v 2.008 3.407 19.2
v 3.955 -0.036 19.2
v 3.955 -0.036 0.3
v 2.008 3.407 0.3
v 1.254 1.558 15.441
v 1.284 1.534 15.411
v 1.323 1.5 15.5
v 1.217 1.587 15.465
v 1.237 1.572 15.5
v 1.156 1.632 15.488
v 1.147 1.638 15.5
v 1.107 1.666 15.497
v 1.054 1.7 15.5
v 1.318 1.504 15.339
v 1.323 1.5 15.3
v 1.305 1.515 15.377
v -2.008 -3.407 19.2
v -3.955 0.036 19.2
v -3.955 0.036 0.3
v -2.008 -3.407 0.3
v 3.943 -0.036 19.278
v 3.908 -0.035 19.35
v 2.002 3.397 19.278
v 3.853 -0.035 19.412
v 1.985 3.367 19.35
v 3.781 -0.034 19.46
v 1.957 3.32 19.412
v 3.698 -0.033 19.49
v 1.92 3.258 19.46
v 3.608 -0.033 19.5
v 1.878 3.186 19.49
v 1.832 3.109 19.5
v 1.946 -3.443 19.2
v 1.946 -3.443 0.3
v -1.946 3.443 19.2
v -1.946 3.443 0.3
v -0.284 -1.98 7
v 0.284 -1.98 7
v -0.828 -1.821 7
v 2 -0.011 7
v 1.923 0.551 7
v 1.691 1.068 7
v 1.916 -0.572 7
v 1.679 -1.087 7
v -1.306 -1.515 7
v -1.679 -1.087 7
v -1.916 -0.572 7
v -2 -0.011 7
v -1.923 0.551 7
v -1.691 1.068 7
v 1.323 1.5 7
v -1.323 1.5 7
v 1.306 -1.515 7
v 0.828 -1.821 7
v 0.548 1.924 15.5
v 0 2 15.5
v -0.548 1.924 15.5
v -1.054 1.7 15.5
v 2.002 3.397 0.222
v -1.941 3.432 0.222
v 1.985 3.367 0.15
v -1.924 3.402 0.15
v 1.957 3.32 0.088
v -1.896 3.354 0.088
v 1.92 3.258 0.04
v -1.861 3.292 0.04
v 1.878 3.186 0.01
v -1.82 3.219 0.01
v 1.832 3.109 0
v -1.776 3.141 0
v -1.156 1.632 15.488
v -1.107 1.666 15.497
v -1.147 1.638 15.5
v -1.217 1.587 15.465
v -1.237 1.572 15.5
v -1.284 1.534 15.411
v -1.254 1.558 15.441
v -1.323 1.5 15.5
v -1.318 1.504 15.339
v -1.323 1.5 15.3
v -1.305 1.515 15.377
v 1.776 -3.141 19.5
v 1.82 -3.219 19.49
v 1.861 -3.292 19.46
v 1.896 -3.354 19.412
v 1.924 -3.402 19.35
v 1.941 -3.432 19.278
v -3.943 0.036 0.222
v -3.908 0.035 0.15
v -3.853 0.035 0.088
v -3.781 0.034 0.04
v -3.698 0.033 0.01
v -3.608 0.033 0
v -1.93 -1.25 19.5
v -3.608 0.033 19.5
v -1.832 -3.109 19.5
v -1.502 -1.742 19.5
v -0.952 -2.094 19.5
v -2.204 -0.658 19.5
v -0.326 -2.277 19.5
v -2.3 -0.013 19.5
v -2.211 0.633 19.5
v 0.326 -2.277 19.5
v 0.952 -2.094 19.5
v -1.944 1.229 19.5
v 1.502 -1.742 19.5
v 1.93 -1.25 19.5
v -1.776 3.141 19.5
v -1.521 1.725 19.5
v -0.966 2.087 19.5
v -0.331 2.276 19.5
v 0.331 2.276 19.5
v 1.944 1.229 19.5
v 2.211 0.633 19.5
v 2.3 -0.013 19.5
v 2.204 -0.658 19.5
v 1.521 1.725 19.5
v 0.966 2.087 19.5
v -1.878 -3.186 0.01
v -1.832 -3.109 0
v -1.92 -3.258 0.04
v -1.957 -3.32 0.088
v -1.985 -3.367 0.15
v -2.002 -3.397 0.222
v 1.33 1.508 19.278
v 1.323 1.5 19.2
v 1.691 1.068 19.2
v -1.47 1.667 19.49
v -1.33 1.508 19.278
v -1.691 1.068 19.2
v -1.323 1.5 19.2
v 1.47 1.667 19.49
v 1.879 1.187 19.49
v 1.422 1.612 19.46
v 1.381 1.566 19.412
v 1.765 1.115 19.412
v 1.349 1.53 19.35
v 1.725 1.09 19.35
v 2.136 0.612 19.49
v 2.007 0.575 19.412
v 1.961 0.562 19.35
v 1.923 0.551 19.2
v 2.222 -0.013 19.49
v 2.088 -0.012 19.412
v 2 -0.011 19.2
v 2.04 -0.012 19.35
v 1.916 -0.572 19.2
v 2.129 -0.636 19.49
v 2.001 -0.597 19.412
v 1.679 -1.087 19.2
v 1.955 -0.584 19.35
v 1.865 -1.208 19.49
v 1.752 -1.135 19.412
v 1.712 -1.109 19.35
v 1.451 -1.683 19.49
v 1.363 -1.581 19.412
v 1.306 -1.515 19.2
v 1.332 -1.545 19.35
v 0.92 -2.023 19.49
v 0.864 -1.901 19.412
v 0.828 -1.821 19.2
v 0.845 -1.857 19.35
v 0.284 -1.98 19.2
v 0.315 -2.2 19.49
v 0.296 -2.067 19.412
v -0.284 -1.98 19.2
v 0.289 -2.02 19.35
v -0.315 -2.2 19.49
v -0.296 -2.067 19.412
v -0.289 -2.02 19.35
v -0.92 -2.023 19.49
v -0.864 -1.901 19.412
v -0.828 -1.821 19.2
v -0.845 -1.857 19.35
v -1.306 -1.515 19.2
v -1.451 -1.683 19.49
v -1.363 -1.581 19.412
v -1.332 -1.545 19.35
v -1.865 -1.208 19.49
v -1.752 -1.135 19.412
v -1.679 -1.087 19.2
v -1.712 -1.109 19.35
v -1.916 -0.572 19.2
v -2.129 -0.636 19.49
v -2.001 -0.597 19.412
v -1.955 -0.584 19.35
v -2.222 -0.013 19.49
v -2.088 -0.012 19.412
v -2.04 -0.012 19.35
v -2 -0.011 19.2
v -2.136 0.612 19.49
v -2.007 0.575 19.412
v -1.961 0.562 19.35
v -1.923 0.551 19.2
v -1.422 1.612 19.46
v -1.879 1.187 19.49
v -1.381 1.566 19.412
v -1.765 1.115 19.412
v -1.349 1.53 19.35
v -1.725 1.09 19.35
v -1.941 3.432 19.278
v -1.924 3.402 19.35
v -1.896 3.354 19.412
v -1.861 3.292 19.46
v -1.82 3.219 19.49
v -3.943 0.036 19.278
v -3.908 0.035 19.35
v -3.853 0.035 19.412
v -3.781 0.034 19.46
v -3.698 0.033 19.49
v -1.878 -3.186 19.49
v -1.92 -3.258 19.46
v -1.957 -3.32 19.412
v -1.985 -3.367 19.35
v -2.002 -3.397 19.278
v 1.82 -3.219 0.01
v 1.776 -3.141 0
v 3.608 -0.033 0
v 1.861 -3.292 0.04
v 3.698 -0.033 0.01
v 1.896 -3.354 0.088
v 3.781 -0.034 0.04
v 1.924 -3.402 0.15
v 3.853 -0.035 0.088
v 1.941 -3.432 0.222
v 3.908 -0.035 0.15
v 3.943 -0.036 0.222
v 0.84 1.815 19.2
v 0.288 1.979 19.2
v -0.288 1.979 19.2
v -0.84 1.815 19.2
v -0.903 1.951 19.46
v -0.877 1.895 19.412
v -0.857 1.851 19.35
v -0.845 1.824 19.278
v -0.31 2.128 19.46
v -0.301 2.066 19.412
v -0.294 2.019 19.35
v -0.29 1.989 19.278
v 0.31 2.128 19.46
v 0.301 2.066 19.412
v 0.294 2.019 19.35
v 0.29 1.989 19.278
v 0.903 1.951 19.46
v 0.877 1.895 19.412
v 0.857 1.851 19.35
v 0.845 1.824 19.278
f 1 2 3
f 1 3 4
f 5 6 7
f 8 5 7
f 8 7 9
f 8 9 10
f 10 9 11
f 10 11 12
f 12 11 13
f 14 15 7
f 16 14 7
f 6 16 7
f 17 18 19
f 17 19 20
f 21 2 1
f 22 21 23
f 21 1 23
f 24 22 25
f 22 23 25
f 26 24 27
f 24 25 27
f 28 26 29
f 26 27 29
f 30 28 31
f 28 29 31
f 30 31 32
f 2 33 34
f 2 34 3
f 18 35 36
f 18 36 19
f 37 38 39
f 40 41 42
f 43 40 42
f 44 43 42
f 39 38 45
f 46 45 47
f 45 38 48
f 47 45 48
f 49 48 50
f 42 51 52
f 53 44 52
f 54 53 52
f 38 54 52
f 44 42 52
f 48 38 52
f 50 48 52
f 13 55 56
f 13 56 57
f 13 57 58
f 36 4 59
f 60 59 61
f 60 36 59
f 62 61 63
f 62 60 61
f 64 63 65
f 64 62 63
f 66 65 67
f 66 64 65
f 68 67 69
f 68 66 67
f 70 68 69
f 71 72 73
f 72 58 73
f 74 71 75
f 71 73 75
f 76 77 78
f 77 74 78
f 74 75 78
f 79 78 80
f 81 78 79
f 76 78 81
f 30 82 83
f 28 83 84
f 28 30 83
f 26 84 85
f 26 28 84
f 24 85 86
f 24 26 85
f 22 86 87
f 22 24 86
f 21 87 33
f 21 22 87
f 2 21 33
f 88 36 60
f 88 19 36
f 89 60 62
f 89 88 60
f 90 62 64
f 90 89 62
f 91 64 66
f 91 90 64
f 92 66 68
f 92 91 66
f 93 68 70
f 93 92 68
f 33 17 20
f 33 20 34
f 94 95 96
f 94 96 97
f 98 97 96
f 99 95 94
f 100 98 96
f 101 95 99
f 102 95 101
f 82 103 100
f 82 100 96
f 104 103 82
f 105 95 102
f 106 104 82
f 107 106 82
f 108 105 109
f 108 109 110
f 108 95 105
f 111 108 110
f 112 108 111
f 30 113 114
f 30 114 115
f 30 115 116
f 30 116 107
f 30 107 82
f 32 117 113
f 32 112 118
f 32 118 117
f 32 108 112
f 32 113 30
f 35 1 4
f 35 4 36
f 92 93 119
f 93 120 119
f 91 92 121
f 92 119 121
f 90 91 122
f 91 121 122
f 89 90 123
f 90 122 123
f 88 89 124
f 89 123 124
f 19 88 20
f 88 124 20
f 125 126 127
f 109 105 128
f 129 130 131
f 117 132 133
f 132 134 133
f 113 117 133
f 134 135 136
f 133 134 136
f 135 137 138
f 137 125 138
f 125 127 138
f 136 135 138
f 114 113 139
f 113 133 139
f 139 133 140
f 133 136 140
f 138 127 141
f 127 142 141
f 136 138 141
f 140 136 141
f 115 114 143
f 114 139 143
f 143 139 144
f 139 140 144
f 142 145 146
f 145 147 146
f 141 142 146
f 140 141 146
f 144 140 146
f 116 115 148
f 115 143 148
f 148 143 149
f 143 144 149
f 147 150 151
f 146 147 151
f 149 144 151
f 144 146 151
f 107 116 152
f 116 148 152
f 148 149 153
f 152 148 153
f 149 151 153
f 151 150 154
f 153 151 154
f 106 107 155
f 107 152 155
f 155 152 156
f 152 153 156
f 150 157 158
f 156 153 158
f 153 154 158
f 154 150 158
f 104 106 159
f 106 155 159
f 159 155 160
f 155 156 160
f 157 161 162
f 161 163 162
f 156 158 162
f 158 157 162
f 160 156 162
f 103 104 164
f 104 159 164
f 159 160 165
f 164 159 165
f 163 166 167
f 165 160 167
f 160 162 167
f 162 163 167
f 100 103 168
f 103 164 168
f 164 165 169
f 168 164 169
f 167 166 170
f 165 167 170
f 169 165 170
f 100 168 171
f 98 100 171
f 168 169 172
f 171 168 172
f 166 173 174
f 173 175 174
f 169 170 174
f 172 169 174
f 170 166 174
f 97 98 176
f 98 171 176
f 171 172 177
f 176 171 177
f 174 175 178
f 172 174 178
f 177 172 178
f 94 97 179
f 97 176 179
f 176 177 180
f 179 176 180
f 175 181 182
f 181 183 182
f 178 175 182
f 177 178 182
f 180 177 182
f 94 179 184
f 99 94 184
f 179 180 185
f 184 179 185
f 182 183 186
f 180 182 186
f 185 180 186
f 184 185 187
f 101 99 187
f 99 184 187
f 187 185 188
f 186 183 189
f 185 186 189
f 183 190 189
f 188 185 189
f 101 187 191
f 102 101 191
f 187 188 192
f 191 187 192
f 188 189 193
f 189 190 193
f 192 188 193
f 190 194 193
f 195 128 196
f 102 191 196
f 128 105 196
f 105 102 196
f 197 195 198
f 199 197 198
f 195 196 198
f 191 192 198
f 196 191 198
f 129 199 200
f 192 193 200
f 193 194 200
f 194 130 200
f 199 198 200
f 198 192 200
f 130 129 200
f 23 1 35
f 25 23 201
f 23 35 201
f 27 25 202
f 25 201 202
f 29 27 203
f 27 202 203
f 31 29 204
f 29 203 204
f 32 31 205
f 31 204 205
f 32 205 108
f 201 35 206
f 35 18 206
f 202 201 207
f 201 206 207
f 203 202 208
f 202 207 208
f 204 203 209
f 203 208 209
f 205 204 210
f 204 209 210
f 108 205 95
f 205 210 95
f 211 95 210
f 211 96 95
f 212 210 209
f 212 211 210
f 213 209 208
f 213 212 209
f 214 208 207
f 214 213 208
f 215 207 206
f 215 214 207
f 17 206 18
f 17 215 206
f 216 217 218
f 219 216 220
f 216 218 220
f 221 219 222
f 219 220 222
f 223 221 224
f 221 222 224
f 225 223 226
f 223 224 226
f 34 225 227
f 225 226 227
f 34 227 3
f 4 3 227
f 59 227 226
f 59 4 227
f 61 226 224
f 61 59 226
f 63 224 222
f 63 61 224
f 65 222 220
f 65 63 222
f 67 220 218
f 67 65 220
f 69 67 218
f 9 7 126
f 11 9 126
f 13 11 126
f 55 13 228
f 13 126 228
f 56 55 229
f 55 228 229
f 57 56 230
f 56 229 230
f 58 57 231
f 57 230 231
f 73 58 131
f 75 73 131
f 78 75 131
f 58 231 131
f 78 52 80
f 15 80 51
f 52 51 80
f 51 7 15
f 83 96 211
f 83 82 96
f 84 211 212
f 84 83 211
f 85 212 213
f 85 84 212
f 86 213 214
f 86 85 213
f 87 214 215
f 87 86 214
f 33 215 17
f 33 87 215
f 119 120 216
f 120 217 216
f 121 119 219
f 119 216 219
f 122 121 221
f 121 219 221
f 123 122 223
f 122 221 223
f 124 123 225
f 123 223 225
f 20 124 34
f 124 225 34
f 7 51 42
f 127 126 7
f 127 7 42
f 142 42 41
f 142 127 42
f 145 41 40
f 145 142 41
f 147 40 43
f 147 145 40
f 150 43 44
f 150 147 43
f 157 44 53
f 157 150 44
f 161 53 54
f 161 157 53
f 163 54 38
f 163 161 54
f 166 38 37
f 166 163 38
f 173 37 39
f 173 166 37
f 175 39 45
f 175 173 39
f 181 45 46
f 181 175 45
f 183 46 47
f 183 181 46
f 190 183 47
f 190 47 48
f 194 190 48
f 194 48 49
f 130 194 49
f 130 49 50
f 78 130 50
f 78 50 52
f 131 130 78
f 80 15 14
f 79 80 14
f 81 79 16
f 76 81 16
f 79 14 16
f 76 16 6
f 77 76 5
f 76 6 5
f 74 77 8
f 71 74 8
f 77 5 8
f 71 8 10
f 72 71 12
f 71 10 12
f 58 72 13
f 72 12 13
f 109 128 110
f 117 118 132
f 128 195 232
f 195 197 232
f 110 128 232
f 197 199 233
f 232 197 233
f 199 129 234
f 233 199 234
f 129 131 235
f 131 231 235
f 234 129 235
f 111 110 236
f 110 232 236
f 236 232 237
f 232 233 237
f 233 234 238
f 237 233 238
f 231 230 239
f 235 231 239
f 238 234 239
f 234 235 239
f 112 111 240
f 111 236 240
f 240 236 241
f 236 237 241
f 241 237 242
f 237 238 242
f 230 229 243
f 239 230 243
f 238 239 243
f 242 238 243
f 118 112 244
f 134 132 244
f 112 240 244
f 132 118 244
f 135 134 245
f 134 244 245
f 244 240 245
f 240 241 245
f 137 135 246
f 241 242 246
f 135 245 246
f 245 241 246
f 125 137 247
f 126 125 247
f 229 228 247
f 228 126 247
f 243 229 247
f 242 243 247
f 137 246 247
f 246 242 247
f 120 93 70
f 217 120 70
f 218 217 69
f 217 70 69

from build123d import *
from build123d.topology import SkipClean

# Parameters (mm, degrees)
EXTRUDE_1_DEPTH     = 19.5
CUT_EXTRUDE_1_DEPTH = 12.5
SKETCH_3_R          = 2
CUT_EXTRUDE_2_DEPTH = 4
FILLET_1_R          = 0.3
FILLET_2_R          = 0.2


with BuildPart() as part:
    # Эскиз1 → Бобышка-Вытянуть1 (new body)
    with BuildSketch(Plane.XY):
        Polygon((2.008322, 3.406975), (-1.946366, 3.442745), (-3.954688, 0.03577), (-2.008322, -3.406975), (1.946366, -3.442745), (3.954688, -0.03577), align=None)
    extrude(amount=EXTRUDE_1_DEPTH)

    # Эскиз2 → Вырез-Вытянуть1 (cut)
    with BuildSketch(Plane.XY.offset(19.5)):
        with BuildLine():
            Line((-1.322876, 1.5), (1.322876, 1.5))
            ThreePointArc((1.322876, 1.5), (0, -2), (-1.322876, 1.5))
        make_face()
    extrude(amount=-CUT_EXTRUDE_1_DEPTH, mode=Mode.SUBTRACT)

    # Эскиз3 → Вырез-Вытянуть2 (cut)
    with SkipClean():  # the faces are left unmerged after this step: merging them gives an invalid solid
        with BuildSketch(Plane.XY.offset(19.5)):
            Circle(SKETCH_3_R)
        extrude(amount=-CUT_EXTRUDE_2_DEPTH, mode=Mode.SUBTRACT)

    # Скругление1
    fillet_1_edges = [part.edges().sort_by_distance(p)[0] for p in [
        (-2.950527, 1.739258, 19.5),
        (-2.981505, -1.685602, 19.5),
        (-0.030978, -3.42486, 19.5),
        (2.950527, -1.739258, 19.5),
        (-0.822876, -1.822876, 19.5),
        (2.981505, 1.685602, 19.5),
        (2.950527, -1.739258, 0),
        (-0.030978, -3.42486, 0),
        (-2.981505, -1.685602, 0),
        (0.030978, 3.42486, 19.5),
        (-2.950527, 1.739258, 0),
        (0.030978, 3.42486, 0),
        (2.981505, 1.685602, 0),
    ]]
    fillet(fillet_1_edges, radius=FILLET_1_R)

    # Скругление2
    # the kernel refuses this fillet: 0.2 mm, written as the material it takes off along each edge
    with BuildSketch(Plane(origin=(1.822876, 1.5, 15.5), x_dir=(0, 1, 0), z_dir=(-1, 0, 0))) as fillet_2_piece_1_section:
        with BuildLine():
            CenterArc((FILLET_2_R, FILLET_2_R), FILLET_2_R, 180, 90)
            Line((0, FILLET_2_R), (0, 0))
            Line((0, 0), (FILLET_2_R, 0))
        make_face()
    fillet_2_piece_1 = extrude(amount=3.645751, mode=Mode.PRIVATE)
    fillet_2_piece_1 = fillet_2_piece_1 & Plane(origin=(0, 0, 15.453639), x_dir=(0.6614378277661478, 0.75, 0), z_dir=(0, 0, 1)) * Cylinder(2, 9, mode=Mode.PRIVATE)
    add(fillet_2_piece_1, mode=Mode.SUBTRACT)


solid = part.part
